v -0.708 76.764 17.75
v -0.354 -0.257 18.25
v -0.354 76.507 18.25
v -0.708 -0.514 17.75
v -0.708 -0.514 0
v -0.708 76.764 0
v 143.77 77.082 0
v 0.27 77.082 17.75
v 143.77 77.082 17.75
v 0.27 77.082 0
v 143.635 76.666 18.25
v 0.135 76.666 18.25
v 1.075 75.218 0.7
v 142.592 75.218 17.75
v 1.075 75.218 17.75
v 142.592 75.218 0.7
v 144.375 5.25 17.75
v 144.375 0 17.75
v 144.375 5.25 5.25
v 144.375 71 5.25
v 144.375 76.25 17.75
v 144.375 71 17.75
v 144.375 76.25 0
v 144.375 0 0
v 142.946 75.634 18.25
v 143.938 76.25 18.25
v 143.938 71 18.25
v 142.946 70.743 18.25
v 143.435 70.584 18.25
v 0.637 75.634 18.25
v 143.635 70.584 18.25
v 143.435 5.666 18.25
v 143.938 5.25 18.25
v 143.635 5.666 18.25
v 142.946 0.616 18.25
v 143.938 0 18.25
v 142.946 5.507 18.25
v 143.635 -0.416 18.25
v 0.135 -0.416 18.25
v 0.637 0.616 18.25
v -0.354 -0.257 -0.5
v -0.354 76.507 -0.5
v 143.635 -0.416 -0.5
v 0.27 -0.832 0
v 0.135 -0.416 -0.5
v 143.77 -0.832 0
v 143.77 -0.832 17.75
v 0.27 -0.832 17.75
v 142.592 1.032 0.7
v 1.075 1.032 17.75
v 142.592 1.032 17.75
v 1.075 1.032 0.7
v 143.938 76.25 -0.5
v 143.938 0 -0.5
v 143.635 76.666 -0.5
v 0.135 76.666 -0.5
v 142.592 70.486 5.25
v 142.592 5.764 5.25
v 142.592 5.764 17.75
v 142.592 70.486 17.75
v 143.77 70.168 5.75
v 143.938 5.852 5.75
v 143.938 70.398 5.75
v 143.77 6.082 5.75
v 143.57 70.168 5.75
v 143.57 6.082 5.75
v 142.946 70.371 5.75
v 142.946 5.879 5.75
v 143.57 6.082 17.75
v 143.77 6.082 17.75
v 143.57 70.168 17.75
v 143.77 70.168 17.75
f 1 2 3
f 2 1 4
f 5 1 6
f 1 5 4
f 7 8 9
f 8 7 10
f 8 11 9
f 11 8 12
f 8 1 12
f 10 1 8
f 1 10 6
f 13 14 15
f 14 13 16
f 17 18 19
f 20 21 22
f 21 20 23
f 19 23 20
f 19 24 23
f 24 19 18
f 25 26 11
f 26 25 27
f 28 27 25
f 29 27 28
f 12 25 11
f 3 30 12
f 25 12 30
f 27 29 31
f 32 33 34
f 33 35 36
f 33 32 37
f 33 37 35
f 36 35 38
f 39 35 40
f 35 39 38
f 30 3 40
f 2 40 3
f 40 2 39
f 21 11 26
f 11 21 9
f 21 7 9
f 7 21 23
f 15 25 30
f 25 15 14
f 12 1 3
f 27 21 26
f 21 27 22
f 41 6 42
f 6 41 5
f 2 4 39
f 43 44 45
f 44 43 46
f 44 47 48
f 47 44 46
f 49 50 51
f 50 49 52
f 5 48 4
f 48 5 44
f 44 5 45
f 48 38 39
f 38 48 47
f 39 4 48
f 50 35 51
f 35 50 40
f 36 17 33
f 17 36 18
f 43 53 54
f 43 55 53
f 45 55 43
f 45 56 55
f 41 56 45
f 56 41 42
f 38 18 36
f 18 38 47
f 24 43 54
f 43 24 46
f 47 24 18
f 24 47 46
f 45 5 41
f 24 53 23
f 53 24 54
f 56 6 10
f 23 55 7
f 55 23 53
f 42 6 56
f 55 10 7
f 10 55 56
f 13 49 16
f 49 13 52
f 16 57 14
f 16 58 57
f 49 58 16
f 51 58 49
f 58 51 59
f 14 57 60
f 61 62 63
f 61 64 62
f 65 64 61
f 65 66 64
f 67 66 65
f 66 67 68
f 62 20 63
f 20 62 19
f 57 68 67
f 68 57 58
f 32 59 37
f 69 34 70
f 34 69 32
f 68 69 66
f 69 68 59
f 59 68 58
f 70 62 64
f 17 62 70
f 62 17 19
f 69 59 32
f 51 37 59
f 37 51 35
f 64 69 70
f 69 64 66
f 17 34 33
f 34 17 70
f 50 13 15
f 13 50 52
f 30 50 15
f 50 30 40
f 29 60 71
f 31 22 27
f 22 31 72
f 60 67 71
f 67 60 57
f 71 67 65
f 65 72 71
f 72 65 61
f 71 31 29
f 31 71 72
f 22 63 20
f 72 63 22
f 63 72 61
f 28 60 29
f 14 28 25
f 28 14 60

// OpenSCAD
ATOM = 0.001*200;
WALL = 1.75;
LENGTH = 140;
WIDTH1 = 32+39 + WALL;
HEIGHT = 16;

TOTAL_WIDTH = WALL + WIDTH1 + WALL;
TOTAL_LENGTH = WALL + LENGTH + WALL;
TOTAL_HEIGHT = WALL + HEIGHT;

echo(TOTAL_WIDTH);

module compartment(length, width, height, hole=false) {
    difference() {
        cube([length + WALL*2, width + WALL*2, height+WALL]);
        
        translate([ATOM, ATOM, ATOM])
        cube([length + WALL*2-ATOM*2, width + WALL*2-ATOM*2, height + WALL+ATOM]);
        
        if (hole)
            translate([WALL, WALL*3, WALL*3])
            cube([length + WALL*2, width - WALL*4, height+WALL]);
    }
}

module skeleton() {
    compartment(LENGTH, WIDTH1, HEIGHT, true);
}

module all() {
    minkowski() {
        skeleton();
        scale([1, 1, 0.66])
        sphere(WALL/2);
    }
}

difference() {
    all();
    //cube(LENGTH/2, center=true);
}
